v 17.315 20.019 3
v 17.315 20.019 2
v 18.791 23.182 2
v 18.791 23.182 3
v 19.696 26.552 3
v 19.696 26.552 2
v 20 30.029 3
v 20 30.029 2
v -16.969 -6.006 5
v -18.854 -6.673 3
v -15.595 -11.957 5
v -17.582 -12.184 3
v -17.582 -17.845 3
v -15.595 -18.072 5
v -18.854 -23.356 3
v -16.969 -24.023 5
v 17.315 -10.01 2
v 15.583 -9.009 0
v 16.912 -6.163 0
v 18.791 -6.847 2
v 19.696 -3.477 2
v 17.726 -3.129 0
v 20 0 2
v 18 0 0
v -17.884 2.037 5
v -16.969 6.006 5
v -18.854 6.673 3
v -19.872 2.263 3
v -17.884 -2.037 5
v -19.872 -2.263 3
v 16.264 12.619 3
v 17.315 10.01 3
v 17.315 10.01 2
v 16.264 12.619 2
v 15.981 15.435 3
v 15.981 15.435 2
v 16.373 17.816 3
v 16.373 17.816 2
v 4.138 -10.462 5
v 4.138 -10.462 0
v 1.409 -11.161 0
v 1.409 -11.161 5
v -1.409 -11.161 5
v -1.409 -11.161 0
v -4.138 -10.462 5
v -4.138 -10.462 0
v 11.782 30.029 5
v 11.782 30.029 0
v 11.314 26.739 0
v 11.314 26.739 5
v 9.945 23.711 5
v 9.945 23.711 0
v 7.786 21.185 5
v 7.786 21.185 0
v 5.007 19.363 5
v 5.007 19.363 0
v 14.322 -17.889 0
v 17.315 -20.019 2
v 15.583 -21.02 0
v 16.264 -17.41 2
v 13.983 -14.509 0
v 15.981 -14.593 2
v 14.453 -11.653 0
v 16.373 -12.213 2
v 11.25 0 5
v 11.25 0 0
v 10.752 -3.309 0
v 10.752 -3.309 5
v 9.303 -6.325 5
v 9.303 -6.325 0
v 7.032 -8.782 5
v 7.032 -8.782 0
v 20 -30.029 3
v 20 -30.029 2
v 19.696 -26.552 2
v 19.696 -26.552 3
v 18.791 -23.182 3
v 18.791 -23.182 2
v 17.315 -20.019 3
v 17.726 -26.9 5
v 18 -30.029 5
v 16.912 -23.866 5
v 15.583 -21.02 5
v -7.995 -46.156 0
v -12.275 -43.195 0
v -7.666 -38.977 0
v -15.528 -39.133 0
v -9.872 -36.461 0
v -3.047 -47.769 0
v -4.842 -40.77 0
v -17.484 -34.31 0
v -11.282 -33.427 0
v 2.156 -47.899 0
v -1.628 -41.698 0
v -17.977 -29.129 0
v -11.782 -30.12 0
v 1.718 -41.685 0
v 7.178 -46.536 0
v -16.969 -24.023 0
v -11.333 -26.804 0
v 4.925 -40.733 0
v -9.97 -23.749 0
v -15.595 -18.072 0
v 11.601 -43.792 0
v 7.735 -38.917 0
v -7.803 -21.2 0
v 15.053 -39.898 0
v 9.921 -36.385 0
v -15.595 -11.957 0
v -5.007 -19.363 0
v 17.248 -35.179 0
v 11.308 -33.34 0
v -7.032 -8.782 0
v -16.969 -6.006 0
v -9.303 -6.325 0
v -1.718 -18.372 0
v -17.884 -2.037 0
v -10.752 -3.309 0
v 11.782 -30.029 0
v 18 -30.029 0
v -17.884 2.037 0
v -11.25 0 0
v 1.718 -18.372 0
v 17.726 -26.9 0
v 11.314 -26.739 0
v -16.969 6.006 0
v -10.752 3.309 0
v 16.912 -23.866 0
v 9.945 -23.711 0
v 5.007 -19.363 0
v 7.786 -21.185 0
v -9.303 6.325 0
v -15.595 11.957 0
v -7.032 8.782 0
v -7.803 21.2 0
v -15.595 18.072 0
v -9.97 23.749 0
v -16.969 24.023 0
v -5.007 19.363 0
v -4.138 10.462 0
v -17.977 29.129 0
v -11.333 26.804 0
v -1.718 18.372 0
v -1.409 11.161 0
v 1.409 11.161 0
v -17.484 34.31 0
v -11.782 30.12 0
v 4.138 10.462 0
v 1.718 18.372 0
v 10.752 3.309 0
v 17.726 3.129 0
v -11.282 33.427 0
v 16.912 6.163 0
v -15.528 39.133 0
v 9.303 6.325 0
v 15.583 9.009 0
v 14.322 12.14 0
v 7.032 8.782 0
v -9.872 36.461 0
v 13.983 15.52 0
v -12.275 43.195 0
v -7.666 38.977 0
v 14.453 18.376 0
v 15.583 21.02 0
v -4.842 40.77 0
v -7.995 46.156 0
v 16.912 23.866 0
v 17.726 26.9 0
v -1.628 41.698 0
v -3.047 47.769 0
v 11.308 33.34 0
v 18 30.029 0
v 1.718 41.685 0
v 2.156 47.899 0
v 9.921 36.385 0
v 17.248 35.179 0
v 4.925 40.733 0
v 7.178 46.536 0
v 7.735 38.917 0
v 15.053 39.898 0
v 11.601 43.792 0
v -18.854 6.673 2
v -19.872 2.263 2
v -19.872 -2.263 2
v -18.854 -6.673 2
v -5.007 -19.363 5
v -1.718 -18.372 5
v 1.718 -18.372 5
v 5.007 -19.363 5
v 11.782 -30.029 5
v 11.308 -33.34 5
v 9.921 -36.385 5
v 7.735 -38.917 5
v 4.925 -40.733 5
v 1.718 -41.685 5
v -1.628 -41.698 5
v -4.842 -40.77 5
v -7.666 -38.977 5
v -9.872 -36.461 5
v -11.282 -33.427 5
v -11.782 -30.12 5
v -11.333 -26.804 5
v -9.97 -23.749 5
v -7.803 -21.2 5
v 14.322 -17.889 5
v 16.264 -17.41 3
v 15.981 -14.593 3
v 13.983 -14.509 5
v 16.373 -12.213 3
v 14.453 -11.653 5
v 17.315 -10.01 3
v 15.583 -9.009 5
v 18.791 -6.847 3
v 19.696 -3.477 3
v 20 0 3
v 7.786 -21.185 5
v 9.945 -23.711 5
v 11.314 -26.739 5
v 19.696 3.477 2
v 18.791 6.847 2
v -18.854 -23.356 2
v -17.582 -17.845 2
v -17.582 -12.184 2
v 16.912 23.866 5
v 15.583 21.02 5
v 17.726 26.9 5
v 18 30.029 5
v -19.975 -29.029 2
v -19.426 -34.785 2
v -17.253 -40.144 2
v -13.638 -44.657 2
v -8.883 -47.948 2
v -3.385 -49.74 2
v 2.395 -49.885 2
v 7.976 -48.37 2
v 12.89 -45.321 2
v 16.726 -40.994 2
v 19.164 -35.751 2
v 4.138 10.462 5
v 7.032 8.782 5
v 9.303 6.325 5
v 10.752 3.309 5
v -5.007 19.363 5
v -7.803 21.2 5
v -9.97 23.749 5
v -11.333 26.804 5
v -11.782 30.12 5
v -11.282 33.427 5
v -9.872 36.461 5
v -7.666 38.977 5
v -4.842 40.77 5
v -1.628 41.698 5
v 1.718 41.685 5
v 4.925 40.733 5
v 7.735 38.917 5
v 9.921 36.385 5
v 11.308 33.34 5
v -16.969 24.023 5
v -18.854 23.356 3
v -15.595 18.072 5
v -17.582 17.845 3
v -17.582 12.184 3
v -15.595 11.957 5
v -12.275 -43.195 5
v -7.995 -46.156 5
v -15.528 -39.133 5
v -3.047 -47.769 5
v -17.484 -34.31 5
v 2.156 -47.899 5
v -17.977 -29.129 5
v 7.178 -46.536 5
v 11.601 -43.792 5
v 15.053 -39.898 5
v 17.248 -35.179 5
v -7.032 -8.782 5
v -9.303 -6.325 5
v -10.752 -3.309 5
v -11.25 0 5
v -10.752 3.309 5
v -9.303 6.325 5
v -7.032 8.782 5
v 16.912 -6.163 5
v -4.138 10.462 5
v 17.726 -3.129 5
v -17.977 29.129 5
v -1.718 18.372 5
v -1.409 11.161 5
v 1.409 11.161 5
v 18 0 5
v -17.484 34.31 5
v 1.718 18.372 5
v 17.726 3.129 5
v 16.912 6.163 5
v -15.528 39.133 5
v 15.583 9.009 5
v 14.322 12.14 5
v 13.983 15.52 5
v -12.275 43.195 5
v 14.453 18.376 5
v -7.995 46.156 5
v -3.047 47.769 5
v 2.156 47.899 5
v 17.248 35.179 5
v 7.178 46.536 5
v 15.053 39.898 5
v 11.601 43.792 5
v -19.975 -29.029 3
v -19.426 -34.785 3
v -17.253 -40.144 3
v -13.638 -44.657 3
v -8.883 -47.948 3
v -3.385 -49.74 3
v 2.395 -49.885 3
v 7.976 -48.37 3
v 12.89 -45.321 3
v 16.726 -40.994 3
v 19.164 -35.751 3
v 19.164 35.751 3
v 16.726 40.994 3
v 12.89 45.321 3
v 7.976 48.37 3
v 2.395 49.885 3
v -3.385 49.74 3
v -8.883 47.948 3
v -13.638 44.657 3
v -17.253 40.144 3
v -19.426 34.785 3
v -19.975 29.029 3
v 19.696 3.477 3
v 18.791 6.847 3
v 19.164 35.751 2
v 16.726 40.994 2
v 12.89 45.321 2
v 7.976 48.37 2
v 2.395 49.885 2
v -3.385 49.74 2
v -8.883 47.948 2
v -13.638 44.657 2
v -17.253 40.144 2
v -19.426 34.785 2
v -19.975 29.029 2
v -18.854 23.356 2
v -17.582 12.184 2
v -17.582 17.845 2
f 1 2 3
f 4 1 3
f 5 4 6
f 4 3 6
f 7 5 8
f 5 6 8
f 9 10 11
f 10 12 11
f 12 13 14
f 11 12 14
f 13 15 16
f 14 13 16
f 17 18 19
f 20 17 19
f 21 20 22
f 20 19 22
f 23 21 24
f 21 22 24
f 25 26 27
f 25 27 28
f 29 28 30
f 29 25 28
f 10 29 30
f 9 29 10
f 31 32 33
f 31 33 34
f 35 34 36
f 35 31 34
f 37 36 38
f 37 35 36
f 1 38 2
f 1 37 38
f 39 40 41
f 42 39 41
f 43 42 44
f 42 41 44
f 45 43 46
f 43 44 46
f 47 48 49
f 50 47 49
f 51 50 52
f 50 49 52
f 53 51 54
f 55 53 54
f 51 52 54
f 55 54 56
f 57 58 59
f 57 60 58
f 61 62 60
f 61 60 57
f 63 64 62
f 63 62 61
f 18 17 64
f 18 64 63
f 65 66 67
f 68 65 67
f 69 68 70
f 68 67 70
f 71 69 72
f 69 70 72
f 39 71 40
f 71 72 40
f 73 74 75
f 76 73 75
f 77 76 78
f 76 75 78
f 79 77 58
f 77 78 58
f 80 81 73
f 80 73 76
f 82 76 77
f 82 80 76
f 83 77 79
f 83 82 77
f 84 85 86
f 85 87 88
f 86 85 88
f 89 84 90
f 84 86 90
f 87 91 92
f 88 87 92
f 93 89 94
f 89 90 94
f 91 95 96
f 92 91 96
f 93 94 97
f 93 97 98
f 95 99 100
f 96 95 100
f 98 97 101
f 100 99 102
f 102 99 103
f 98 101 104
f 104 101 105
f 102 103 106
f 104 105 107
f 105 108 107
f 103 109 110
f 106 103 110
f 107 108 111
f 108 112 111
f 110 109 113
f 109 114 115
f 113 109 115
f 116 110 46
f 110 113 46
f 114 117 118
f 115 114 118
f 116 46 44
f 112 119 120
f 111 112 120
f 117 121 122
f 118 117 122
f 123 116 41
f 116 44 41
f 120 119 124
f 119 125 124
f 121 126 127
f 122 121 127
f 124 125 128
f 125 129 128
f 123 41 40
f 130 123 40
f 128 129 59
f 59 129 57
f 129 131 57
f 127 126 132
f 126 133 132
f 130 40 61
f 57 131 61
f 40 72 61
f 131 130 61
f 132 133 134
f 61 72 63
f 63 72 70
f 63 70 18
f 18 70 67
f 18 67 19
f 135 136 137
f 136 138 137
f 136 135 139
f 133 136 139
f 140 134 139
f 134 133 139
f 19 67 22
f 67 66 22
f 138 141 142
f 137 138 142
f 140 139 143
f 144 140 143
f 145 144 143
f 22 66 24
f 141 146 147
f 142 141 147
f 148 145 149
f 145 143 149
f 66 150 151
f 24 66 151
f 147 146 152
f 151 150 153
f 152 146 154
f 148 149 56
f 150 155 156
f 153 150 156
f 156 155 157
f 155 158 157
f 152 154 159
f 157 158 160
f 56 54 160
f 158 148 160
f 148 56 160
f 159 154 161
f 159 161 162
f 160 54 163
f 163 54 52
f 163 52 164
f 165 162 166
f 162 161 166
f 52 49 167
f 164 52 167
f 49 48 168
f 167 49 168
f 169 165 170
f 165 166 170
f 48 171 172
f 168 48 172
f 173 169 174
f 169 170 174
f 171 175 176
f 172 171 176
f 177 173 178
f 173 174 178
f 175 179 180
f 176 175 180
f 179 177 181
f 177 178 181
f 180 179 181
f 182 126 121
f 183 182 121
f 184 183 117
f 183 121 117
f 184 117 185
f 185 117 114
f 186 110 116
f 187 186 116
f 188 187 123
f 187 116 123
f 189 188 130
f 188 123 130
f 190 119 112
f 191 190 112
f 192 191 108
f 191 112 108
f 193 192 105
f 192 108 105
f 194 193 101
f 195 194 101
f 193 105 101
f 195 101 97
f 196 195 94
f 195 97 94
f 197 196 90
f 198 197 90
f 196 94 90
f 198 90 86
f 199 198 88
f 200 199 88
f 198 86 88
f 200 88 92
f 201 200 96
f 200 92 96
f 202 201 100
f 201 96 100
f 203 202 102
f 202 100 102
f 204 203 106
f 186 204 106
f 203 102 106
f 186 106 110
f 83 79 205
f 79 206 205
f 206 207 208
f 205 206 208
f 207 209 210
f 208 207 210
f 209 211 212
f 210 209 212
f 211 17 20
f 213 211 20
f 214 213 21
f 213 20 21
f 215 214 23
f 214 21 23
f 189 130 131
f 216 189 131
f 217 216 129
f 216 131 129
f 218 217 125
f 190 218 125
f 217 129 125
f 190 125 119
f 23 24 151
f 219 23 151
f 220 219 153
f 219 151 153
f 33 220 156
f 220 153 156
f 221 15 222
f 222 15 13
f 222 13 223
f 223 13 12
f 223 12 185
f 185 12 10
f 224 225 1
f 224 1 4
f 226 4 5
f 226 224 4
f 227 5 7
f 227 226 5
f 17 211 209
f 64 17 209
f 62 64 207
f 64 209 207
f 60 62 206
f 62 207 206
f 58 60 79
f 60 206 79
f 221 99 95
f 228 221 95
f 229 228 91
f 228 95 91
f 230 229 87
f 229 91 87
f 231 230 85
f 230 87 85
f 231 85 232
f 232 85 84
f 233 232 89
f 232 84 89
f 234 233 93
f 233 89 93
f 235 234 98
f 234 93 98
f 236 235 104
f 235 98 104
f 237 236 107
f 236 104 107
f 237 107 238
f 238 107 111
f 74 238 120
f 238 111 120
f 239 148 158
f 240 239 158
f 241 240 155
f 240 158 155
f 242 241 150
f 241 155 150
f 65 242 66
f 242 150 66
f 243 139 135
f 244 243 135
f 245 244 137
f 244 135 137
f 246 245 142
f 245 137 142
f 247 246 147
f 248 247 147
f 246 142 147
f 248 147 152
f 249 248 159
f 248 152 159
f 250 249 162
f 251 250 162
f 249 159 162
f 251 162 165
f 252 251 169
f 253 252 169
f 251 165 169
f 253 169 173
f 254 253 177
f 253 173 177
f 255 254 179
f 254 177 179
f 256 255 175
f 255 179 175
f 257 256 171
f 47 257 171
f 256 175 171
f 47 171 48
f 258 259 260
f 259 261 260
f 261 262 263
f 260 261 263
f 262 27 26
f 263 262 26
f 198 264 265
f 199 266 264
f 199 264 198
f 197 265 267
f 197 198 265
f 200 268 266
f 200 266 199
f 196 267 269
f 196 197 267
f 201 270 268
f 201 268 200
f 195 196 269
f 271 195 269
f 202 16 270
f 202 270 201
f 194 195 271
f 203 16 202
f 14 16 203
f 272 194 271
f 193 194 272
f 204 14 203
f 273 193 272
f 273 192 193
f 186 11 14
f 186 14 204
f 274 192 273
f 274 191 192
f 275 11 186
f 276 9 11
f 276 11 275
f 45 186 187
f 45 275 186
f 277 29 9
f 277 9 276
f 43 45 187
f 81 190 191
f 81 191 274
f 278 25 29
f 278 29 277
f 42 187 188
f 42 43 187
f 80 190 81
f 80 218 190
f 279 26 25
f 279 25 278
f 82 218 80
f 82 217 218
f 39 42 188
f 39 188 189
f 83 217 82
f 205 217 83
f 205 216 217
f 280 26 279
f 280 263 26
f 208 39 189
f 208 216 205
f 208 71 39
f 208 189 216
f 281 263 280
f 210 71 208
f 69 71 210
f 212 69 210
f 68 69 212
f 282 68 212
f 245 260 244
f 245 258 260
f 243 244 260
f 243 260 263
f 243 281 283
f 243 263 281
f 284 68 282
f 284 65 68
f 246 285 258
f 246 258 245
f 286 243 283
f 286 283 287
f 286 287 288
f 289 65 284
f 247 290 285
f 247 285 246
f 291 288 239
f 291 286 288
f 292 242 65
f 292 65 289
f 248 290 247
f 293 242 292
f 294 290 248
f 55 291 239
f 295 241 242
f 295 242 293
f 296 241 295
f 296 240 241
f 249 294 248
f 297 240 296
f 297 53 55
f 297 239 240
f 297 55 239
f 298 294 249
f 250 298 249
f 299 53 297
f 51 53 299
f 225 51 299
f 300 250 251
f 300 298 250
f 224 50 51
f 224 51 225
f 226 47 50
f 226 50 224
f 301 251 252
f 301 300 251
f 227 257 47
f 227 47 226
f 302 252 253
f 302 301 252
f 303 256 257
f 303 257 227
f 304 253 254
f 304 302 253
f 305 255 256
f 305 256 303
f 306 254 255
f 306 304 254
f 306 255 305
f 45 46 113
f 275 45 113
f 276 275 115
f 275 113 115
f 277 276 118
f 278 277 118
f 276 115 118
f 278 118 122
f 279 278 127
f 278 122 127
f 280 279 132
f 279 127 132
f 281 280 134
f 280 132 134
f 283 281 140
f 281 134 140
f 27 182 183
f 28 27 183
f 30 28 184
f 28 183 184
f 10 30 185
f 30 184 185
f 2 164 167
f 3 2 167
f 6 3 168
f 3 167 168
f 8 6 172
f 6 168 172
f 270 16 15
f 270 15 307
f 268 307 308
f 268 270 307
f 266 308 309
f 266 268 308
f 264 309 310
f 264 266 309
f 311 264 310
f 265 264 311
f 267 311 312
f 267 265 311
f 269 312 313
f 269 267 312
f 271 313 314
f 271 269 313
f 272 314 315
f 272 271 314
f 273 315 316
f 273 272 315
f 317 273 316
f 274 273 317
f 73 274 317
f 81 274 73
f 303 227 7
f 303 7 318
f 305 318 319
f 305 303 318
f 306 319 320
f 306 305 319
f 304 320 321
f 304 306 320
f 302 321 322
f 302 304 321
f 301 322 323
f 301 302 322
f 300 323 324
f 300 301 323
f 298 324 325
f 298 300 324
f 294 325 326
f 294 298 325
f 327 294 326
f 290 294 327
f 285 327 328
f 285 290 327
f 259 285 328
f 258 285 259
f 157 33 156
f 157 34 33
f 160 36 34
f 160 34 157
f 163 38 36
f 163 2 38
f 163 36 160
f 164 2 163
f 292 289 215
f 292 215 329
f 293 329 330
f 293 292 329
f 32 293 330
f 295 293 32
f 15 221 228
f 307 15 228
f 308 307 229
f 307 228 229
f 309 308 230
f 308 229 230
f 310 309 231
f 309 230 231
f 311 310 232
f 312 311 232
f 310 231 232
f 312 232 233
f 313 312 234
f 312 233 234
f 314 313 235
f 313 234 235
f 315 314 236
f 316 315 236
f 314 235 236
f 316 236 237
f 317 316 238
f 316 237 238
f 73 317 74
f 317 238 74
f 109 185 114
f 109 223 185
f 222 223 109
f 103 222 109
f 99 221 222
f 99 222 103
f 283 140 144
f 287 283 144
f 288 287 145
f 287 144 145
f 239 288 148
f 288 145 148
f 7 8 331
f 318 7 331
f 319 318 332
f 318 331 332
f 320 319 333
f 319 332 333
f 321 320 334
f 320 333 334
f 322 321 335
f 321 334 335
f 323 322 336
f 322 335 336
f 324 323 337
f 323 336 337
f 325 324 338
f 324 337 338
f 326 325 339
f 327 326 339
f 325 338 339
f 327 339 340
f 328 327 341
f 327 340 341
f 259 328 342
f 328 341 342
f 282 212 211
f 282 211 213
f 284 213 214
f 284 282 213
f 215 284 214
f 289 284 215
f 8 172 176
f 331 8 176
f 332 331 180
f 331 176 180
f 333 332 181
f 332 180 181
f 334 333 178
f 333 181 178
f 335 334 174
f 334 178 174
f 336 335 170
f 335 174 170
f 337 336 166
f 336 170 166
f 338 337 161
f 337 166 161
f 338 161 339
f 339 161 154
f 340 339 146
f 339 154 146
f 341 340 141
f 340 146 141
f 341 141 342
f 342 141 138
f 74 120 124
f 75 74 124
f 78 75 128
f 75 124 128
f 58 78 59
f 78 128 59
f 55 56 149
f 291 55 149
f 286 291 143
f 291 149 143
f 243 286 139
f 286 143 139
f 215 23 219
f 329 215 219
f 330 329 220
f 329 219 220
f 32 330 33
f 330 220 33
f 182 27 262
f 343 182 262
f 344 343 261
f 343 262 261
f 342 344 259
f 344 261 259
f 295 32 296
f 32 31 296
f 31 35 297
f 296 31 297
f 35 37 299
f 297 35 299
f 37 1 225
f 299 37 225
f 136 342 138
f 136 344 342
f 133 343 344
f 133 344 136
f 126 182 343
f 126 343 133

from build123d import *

# Parameters (mm, degrees)
F1_DEPTH = 5
F2_R     = 10
F3_R     = 25
F4_SIZE  = 2
F5_SIZE  = 2


with BuildPart() as f1:
    # F0 (on Top) → F1 (new body)
    with BuildSketch(Plane.XY):
        with BuildLine():
            ThreePointArc((-4.137504636, -10.4615273926), (-11.25, 0), (-4.137504636, 10.4615273926))
            ThreePointArc((-4.137504636, 10.4615273926), (-8.9686549041, 12.1525425178), (-13.2123684763, 15.0144370273))
            ThreePointArc((-13.2123684763, 15.0144370273), (-20, 0), (-13.2123684763, -15.0144370273))
            ThreePointArc((-13.2123684763, -15.0144370273), (-8.9686549041, -12.1525425178), (-4.137504636, -10.4615273926))
        make_face()
        with BuildLine():
            ThreePointArc((4.137504636, 10.4615273926), (9.303478574, 6.3251708611), (11.25, 0))
            ThreePointArc((11.25, 0), (9.303478574, -6.3251708611), (4.137504636, -10.4615273926))
            ThreePointArc((4.137504636, -10.4615273926), (8.9686549041, -12.1525425178), (13.2123684763, -15.0144370273))
            ThreePointArc((13.2123684763, -15.0144370273), (18.2242608839, -8.2387083476), (20, 0))
            ThreePointArc((20, 0), (18.2242608839, 8.2387083476), (13.2123684763, 15.0144370273))
            ThreePointArc((13.2123684763, 15.0144370273), (8.9686549041, 12.1525425178), (4.137504636, 10.4615273926))
        make_face()
        with BuildLine():
            ThreePointArc((-4.137504636, 10.4615273926), (0, 11.25), (4.137504636, 10.4615273926))
            ThreePointArc((4.137504636, 10.4615273926), (8.9686549041, 12.1525425178), (13.2123684763, 15.0144370273))
            ThreePointArc((13.2123684763, 15.0144370273), (9.3655087913, 17.6716508872), (5.0068447736, 19.3631481277))
            ThreePointArc((5.0068447736, 19.3631481277), (0, 18.2464208238), (-5.0068447736, 19.3631481277))
            ThreePointArc((-5.0068447736, 19.3631481277), (-9.3655087913, 17.6716508872), (-13.2123684763, 15.0144370273))
            ThreePointArc((-13.2123684763, 15.0144370273), (-8.9686549041, 12.1525425178), (-4.137504636, 10.4615273926))
        make_face()
        with BuildLine():
            ThreePointArc((13.2123684763, -15.0144370273), (8.9686549041, -12.1525425178), (4.137504636, -10.4615273926))
            ThreePointArc((4.137504636, -10.4615273926), (0, -11.25), (-4.137504636, -10.4615273926))
            ThreePointArc((-4.137504636, -10.4615273926), (-8.9686549041, -12.1525425178), (-13.2123684763, -15.0144370273))
            ThreePointArc((-13.2123684763, -15.0144370273), (-9.3655087913, -17.6716508872), (-5.0068447736, -19.3631481277))
            ThreePointArc((-5.0068447736, -19.3631481277), (0, -18.2464208238), (5.0068447736, -19.3631481277))
            ThreePointArc((5.0068447736, -19.3631481277), (9.3655087913, -17.6716508872), (13.2123684763, -15.0144370273))
        make_face()
        with BuildLine():
            ThreePointArc((5.0068447736, 19.3631481277), (9.3655087913, 17.6716508872), (13.2123684763, 15.0144370273))
            ThreePointArc((13.2123684763, 15.0144370273), (18.2242608839, 21.790165707), (20, 30.0288740546))
            ThreePointArc((20, 30.0288740546), (-8.2387083476, 48.2531349384), (-13.2123684763, 15.0144370273))
            ThreePointArc((-13.2123684763, 15.0144370273), (-9.3655087913, 17.6716508872), (-5.0068447736, 19.3631481277))
            ThreePointArc((-5.0068447736, 19.3631481277), (-6.3179620827, 39.9742025688), (11.7824532307, 30.0288740546))
            ThreePointArc((11.7824532307, 30.0288740546), (9.9453285142, 23.7109119719), (5.0068447736, 19.3631481277))
        make_face()
        with BuildLine():
            ThreePointArc((20, -30.0288740546), (18.2242608839, -21.790165707), (13.2123684763, -15.0144370273))
            ThreePointArc((13.2123684763, -15.0144370273), (9.3655087913, -17.6716508872), (5.0068447736, -19.3631481277))
            ThreePointArc((5.0068447736, -19.3631481277), (9.9453285142, -23.7109119719), (11.7824532307, -30.0288740546))
            ThreePointArc((11.7824532307, -30.0288740546), (-6.3179620827, -39.9742025688), (-5.0068447736, -19.3631481277))
            ThreePointArc((-5.0068447736, -19.3631481277), (-9.3655087913, -17.6716508872), (-13.2123684763, -15.0144370273))
            ThreePointArc((-13.2123684763, -15.0144370273), (-8.2387083476, -48.2531349384), (20, -30.0288740546))
        make_face()
    extrude(amount=F1_DEPTH)

    # F2
    f2_edges = [f1.edges().sort_by_distance(p)[0] for p in [
        (13.212368, -15.014437, 2.5),
        (13.212368, 15.014437, 2.5),
    ]]
    fillet(f2_edges, radius=F2_R)

    # F3
    f3_edges = [f1.edges().sort_by_distance(p)[0] for p in [
        (-13.212368, -15.014437, 2.5),
        (-13.212368, 15.014437, 2.5),
    ]]
    fillet(f3_edges, radius=F3_R)

    # F4
    f4_edges = [f1.edges().sort_by_distance(p)[0] for p in [
        (1.83718, -49.944315, 5),
        (-17.4213, -15.014437, 5),
        (-20, 0, 5),
        (-17.4213, 15.014437, 5),
        (1.83718, 49.944315, 5),
        (15.972422, -15.014437, 5),
        (20, 0, 5),
        (15.972422, 15.014437, 5),
    ]]
    chamfer(f4_edges, length=F4_SIZE)

    # F5
    f5_edges = [f1.edges().sort_by_distance(p)[0] for p in [
        (1.83718, -49.944315, 0),
    ]]
    chamfer(f5_edges, length=F5_SIZE)


solid = f1.part
